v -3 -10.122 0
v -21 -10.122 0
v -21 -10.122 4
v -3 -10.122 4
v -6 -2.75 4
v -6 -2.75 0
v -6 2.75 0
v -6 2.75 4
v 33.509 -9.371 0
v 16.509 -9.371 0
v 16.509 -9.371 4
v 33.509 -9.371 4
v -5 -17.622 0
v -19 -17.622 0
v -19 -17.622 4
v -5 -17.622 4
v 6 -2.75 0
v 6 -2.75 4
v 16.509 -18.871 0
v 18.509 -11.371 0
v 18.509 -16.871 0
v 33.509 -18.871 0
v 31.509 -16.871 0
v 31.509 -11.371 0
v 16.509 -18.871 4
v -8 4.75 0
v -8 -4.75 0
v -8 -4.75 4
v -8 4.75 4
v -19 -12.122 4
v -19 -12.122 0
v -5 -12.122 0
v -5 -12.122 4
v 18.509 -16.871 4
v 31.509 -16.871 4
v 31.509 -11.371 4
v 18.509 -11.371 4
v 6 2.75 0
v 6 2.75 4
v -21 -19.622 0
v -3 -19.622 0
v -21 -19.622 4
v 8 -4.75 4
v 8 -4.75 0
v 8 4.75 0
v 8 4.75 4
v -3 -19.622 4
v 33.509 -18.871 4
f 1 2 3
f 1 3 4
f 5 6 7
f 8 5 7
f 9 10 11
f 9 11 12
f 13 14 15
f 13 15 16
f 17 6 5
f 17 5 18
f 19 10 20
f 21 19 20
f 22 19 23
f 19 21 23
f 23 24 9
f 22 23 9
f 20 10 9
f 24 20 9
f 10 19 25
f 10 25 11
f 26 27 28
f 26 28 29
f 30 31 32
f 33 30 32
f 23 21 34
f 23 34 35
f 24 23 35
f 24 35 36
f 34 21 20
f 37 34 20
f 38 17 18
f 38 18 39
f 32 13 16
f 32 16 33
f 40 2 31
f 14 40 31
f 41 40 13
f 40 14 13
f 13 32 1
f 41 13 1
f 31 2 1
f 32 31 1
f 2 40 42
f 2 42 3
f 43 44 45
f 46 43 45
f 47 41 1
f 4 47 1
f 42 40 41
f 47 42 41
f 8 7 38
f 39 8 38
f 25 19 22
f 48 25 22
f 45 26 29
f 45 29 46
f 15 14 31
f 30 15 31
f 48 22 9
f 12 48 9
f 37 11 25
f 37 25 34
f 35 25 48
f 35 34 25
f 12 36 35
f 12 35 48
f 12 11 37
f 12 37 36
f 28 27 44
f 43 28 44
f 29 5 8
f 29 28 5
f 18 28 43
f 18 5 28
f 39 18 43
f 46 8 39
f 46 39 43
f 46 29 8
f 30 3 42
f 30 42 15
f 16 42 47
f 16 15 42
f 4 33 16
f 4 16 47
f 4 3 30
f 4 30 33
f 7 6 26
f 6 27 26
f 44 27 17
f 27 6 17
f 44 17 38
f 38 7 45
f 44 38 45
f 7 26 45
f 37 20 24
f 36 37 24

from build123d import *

# Parameters (mm, degrees)
F0_W     = 18
F0_H     = 9.5
F0_W_2   = 14
F0_H_2   = 5.5
F0_W_3   = 16
F0_W_4   = 12
F0_W_5   = 17
F0_W_6   = 13
F1_DEPTH = 4


with BuildPart() as f1:
    # F0 (on Top) → F1 (new body)
    with BuildSketch(Plane.XY):
        with Locations((-12.000001, -14.872099)):
            Rectangle(F0_W, F0_H)
        with Locations((-12.000001, -14.872099)):
            Rectangle(F0_W_2, F0_H_2, mode=Mode.SUBTRACT)
        Rectangle(F0_W_3, F0_H)
        Rectangle(F0_W_4, F0_H_2, mode=Mode.SUBTRACT)
        with Locations((25.008738, -14.121265)):
            Rectangle(F0_W_5, F0_H)
        with Locations((25.008738, -14.121265)):
            Rectangle(F0_W_6, F0_H_2, mode=Mode.SUBTRACT)
    extrude(amount=F1_DEPTH)


solid = f1.part
